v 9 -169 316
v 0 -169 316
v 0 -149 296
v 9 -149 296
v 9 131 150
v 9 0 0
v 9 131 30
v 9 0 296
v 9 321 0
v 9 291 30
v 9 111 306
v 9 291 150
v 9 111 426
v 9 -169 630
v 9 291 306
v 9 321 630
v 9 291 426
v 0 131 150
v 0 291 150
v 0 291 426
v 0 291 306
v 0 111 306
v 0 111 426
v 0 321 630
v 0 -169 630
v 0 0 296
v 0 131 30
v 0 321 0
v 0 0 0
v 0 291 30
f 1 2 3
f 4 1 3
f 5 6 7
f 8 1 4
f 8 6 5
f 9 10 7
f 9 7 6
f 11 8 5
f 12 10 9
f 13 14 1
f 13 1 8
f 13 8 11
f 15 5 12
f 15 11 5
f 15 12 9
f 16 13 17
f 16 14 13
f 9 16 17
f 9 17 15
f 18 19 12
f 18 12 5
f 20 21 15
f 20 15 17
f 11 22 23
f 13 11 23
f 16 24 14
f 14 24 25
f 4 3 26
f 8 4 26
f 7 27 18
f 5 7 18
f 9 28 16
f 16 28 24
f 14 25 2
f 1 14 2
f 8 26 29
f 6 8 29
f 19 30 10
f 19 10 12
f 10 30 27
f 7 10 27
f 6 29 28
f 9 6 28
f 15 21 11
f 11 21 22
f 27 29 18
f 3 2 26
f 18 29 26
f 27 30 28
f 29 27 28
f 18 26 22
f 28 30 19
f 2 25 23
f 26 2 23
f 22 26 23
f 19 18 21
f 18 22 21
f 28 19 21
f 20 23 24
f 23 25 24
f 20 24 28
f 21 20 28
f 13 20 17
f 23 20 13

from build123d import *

# Parameters (mm, degrees)
F1_DEPTH = 9
F2_W     = 180
F2_H     = 120
F2_W_2   = 160
F3_DEPTH = 25


with BuildPart() as f1:
    # F0 (on Right) → F1 (new body)
    with BuildSketch(Plane.YZ):
        Polygon((0, 296), (0, 0), (321, 0), (321, 630), (-169, 630), (-169, 316), (-149, 296), align=None)
    extrude(amount=F1_DEPTH)

    # F2 (on face) → F3 (cut)
    with BuildSketch(Plane(origin=(0, 0, 0), x_dir=(0, -1, 0), z_dir=(-1, 0, 0))):
        with Locations((-201, 366)):
            Rectangle(F2_W, F2_H)
        with Locations((-211, 90)):
            Rectangle(F2_W_2, F2_H)
    extrude(amount=-F3_DEPTH, mode=Mode.SUBTRACT)


solid = f1.part
